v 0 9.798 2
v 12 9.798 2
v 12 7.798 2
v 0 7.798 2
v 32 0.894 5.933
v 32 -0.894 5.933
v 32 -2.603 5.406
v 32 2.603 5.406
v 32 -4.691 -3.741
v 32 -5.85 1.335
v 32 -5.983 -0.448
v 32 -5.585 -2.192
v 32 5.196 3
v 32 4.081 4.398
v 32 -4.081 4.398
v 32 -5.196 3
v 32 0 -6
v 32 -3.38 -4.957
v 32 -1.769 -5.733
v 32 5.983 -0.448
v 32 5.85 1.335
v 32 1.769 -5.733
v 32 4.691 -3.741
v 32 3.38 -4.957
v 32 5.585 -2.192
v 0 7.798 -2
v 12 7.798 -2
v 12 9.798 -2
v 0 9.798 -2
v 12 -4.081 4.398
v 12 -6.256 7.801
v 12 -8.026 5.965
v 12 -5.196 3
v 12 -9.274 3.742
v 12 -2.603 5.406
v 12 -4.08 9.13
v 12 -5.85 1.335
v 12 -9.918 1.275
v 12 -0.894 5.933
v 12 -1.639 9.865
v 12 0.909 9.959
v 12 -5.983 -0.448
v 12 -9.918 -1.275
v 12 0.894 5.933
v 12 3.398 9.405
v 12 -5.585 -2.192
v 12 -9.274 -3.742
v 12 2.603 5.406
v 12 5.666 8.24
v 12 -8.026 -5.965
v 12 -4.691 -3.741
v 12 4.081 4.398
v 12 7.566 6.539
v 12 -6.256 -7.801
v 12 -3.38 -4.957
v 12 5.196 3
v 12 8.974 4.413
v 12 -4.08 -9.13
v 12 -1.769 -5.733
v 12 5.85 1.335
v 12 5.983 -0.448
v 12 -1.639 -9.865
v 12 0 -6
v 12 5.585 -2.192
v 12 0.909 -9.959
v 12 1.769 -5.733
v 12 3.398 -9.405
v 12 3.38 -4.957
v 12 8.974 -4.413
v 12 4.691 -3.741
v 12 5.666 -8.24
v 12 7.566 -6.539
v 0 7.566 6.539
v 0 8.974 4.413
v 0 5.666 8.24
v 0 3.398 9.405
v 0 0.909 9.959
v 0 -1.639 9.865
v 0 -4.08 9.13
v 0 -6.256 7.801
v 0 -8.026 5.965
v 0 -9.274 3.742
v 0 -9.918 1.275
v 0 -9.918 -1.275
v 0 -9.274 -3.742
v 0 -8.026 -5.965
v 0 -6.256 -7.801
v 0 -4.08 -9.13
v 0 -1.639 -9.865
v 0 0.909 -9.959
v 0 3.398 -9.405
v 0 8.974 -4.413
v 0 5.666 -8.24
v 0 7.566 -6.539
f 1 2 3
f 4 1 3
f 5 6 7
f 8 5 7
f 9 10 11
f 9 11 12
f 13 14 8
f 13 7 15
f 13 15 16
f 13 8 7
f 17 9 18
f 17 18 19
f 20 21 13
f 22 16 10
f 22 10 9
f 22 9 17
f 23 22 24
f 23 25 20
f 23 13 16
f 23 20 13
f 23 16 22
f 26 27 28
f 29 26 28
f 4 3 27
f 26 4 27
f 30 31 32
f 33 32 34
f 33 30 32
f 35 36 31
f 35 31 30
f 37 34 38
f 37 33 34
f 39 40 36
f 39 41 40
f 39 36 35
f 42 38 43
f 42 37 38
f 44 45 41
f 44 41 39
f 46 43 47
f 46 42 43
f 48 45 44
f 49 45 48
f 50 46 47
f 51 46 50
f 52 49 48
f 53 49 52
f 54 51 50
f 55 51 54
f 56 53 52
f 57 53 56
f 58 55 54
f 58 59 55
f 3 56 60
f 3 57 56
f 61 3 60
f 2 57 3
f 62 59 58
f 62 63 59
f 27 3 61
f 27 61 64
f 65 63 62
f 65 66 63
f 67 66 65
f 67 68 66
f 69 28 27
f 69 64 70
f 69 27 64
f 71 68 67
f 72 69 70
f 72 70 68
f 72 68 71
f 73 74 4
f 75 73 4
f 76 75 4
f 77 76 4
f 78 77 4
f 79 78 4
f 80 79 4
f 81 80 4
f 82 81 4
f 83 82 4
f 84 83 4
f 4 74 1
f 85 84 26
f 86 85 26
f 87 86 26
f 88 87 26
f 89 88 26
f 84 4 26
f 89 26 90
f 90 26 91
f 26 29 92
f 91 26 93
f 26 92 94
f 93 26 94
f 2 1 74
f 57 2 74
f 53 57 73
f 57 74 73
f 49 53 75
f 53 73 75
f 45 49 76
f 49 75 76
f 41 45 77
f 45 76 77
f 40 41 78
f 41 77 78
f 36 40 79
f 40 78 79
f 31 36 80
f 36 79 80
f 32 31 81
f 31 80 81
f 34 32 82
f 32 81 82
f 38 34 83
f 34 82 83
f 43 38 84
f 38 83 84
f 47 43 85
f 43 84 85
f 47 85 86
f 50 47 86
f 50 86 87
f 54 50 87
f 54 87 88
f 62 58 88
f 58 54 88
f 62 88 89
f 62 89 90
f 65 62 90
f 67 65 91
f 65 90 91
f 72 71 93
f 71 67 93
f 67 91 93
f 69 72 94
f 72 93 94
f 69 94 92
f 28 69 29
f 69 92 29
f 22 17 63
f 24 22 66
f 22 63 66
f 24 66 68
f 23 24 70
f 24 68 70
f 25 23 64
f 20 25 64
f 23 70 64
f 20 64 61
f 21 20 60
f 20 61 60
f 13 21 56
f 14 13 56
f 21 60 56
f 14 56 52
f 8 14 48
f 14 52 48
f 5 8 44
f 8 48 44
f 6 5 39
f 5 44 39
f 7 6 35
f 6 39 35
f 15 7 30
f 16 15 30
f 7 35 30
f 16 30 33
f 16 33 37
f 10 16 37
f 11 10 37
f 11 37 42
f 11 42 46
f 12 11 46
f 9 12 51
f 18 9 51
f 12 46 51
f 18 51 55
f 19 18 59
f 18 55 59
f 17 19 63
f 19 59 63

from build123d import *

# Parameters (mm, degrees)
BOSS_EXTRUDE1_OUTLINE_R = 10
BOSS_EXTRUDE1_DEPTH     = 12
SKETCH5_R               = 6
BOSS_EXTRUDE2_DEPTH     = 20
CUT_EXTRUDE1_DEPTH      = 25.494897428


# Read off the part's stored shape, not the designer's step: Boss-Extrude1
with BuildPart() as part:
    # Boss-Extrude1 outline → Boss-Extrude1 (new body)
    with BuildSketch(Plane(origin=(0, 0, 0), x_dir=(0, 0, -1), z_dir=(1, 0, 0))):
        Circle(BOSS_EXTRUDE1_OUTLINE_R)
    extrude(amount=BOSS_EXTRUDE1_DEPTH)

    # Sketch5 → Boss-Extrude2 (add)
    with BuildSketch(Plane(origin=(12, 0, 0), x_dir=(0, 0, -1), z_dir=(1, 0, 0))):
        Circle(SKETCH5_R)
    extrude(amount=BOSS_EXTRUDE2_DEPTH)

    # Sketch7 → Cut-Extrude1 (cut, through all)
    with BuildSketch(Plane(origin=(12, 0, 0), x_dir=(0, 0, -1), z_dir=(1, 0, 0))):
        with BuildLine():
            Line((0, 7.797958971), (2, 7.797958971))
            Line((2, 7.797958971), (2, 9.797958971))
            ThreePointArc((2, 9.797958971), (0, 10), (-2, 9.797958971))
            Line((-2, 9.797958971), (-2, 7.797958971))
            Line((-2, 7.797958971), (0, 7.797958971))
        make_face()
    extrude(amount=-CUT_EXTRUDE1_DEPTH, mode=Mode.SUBTRACT)


solid = part.part
